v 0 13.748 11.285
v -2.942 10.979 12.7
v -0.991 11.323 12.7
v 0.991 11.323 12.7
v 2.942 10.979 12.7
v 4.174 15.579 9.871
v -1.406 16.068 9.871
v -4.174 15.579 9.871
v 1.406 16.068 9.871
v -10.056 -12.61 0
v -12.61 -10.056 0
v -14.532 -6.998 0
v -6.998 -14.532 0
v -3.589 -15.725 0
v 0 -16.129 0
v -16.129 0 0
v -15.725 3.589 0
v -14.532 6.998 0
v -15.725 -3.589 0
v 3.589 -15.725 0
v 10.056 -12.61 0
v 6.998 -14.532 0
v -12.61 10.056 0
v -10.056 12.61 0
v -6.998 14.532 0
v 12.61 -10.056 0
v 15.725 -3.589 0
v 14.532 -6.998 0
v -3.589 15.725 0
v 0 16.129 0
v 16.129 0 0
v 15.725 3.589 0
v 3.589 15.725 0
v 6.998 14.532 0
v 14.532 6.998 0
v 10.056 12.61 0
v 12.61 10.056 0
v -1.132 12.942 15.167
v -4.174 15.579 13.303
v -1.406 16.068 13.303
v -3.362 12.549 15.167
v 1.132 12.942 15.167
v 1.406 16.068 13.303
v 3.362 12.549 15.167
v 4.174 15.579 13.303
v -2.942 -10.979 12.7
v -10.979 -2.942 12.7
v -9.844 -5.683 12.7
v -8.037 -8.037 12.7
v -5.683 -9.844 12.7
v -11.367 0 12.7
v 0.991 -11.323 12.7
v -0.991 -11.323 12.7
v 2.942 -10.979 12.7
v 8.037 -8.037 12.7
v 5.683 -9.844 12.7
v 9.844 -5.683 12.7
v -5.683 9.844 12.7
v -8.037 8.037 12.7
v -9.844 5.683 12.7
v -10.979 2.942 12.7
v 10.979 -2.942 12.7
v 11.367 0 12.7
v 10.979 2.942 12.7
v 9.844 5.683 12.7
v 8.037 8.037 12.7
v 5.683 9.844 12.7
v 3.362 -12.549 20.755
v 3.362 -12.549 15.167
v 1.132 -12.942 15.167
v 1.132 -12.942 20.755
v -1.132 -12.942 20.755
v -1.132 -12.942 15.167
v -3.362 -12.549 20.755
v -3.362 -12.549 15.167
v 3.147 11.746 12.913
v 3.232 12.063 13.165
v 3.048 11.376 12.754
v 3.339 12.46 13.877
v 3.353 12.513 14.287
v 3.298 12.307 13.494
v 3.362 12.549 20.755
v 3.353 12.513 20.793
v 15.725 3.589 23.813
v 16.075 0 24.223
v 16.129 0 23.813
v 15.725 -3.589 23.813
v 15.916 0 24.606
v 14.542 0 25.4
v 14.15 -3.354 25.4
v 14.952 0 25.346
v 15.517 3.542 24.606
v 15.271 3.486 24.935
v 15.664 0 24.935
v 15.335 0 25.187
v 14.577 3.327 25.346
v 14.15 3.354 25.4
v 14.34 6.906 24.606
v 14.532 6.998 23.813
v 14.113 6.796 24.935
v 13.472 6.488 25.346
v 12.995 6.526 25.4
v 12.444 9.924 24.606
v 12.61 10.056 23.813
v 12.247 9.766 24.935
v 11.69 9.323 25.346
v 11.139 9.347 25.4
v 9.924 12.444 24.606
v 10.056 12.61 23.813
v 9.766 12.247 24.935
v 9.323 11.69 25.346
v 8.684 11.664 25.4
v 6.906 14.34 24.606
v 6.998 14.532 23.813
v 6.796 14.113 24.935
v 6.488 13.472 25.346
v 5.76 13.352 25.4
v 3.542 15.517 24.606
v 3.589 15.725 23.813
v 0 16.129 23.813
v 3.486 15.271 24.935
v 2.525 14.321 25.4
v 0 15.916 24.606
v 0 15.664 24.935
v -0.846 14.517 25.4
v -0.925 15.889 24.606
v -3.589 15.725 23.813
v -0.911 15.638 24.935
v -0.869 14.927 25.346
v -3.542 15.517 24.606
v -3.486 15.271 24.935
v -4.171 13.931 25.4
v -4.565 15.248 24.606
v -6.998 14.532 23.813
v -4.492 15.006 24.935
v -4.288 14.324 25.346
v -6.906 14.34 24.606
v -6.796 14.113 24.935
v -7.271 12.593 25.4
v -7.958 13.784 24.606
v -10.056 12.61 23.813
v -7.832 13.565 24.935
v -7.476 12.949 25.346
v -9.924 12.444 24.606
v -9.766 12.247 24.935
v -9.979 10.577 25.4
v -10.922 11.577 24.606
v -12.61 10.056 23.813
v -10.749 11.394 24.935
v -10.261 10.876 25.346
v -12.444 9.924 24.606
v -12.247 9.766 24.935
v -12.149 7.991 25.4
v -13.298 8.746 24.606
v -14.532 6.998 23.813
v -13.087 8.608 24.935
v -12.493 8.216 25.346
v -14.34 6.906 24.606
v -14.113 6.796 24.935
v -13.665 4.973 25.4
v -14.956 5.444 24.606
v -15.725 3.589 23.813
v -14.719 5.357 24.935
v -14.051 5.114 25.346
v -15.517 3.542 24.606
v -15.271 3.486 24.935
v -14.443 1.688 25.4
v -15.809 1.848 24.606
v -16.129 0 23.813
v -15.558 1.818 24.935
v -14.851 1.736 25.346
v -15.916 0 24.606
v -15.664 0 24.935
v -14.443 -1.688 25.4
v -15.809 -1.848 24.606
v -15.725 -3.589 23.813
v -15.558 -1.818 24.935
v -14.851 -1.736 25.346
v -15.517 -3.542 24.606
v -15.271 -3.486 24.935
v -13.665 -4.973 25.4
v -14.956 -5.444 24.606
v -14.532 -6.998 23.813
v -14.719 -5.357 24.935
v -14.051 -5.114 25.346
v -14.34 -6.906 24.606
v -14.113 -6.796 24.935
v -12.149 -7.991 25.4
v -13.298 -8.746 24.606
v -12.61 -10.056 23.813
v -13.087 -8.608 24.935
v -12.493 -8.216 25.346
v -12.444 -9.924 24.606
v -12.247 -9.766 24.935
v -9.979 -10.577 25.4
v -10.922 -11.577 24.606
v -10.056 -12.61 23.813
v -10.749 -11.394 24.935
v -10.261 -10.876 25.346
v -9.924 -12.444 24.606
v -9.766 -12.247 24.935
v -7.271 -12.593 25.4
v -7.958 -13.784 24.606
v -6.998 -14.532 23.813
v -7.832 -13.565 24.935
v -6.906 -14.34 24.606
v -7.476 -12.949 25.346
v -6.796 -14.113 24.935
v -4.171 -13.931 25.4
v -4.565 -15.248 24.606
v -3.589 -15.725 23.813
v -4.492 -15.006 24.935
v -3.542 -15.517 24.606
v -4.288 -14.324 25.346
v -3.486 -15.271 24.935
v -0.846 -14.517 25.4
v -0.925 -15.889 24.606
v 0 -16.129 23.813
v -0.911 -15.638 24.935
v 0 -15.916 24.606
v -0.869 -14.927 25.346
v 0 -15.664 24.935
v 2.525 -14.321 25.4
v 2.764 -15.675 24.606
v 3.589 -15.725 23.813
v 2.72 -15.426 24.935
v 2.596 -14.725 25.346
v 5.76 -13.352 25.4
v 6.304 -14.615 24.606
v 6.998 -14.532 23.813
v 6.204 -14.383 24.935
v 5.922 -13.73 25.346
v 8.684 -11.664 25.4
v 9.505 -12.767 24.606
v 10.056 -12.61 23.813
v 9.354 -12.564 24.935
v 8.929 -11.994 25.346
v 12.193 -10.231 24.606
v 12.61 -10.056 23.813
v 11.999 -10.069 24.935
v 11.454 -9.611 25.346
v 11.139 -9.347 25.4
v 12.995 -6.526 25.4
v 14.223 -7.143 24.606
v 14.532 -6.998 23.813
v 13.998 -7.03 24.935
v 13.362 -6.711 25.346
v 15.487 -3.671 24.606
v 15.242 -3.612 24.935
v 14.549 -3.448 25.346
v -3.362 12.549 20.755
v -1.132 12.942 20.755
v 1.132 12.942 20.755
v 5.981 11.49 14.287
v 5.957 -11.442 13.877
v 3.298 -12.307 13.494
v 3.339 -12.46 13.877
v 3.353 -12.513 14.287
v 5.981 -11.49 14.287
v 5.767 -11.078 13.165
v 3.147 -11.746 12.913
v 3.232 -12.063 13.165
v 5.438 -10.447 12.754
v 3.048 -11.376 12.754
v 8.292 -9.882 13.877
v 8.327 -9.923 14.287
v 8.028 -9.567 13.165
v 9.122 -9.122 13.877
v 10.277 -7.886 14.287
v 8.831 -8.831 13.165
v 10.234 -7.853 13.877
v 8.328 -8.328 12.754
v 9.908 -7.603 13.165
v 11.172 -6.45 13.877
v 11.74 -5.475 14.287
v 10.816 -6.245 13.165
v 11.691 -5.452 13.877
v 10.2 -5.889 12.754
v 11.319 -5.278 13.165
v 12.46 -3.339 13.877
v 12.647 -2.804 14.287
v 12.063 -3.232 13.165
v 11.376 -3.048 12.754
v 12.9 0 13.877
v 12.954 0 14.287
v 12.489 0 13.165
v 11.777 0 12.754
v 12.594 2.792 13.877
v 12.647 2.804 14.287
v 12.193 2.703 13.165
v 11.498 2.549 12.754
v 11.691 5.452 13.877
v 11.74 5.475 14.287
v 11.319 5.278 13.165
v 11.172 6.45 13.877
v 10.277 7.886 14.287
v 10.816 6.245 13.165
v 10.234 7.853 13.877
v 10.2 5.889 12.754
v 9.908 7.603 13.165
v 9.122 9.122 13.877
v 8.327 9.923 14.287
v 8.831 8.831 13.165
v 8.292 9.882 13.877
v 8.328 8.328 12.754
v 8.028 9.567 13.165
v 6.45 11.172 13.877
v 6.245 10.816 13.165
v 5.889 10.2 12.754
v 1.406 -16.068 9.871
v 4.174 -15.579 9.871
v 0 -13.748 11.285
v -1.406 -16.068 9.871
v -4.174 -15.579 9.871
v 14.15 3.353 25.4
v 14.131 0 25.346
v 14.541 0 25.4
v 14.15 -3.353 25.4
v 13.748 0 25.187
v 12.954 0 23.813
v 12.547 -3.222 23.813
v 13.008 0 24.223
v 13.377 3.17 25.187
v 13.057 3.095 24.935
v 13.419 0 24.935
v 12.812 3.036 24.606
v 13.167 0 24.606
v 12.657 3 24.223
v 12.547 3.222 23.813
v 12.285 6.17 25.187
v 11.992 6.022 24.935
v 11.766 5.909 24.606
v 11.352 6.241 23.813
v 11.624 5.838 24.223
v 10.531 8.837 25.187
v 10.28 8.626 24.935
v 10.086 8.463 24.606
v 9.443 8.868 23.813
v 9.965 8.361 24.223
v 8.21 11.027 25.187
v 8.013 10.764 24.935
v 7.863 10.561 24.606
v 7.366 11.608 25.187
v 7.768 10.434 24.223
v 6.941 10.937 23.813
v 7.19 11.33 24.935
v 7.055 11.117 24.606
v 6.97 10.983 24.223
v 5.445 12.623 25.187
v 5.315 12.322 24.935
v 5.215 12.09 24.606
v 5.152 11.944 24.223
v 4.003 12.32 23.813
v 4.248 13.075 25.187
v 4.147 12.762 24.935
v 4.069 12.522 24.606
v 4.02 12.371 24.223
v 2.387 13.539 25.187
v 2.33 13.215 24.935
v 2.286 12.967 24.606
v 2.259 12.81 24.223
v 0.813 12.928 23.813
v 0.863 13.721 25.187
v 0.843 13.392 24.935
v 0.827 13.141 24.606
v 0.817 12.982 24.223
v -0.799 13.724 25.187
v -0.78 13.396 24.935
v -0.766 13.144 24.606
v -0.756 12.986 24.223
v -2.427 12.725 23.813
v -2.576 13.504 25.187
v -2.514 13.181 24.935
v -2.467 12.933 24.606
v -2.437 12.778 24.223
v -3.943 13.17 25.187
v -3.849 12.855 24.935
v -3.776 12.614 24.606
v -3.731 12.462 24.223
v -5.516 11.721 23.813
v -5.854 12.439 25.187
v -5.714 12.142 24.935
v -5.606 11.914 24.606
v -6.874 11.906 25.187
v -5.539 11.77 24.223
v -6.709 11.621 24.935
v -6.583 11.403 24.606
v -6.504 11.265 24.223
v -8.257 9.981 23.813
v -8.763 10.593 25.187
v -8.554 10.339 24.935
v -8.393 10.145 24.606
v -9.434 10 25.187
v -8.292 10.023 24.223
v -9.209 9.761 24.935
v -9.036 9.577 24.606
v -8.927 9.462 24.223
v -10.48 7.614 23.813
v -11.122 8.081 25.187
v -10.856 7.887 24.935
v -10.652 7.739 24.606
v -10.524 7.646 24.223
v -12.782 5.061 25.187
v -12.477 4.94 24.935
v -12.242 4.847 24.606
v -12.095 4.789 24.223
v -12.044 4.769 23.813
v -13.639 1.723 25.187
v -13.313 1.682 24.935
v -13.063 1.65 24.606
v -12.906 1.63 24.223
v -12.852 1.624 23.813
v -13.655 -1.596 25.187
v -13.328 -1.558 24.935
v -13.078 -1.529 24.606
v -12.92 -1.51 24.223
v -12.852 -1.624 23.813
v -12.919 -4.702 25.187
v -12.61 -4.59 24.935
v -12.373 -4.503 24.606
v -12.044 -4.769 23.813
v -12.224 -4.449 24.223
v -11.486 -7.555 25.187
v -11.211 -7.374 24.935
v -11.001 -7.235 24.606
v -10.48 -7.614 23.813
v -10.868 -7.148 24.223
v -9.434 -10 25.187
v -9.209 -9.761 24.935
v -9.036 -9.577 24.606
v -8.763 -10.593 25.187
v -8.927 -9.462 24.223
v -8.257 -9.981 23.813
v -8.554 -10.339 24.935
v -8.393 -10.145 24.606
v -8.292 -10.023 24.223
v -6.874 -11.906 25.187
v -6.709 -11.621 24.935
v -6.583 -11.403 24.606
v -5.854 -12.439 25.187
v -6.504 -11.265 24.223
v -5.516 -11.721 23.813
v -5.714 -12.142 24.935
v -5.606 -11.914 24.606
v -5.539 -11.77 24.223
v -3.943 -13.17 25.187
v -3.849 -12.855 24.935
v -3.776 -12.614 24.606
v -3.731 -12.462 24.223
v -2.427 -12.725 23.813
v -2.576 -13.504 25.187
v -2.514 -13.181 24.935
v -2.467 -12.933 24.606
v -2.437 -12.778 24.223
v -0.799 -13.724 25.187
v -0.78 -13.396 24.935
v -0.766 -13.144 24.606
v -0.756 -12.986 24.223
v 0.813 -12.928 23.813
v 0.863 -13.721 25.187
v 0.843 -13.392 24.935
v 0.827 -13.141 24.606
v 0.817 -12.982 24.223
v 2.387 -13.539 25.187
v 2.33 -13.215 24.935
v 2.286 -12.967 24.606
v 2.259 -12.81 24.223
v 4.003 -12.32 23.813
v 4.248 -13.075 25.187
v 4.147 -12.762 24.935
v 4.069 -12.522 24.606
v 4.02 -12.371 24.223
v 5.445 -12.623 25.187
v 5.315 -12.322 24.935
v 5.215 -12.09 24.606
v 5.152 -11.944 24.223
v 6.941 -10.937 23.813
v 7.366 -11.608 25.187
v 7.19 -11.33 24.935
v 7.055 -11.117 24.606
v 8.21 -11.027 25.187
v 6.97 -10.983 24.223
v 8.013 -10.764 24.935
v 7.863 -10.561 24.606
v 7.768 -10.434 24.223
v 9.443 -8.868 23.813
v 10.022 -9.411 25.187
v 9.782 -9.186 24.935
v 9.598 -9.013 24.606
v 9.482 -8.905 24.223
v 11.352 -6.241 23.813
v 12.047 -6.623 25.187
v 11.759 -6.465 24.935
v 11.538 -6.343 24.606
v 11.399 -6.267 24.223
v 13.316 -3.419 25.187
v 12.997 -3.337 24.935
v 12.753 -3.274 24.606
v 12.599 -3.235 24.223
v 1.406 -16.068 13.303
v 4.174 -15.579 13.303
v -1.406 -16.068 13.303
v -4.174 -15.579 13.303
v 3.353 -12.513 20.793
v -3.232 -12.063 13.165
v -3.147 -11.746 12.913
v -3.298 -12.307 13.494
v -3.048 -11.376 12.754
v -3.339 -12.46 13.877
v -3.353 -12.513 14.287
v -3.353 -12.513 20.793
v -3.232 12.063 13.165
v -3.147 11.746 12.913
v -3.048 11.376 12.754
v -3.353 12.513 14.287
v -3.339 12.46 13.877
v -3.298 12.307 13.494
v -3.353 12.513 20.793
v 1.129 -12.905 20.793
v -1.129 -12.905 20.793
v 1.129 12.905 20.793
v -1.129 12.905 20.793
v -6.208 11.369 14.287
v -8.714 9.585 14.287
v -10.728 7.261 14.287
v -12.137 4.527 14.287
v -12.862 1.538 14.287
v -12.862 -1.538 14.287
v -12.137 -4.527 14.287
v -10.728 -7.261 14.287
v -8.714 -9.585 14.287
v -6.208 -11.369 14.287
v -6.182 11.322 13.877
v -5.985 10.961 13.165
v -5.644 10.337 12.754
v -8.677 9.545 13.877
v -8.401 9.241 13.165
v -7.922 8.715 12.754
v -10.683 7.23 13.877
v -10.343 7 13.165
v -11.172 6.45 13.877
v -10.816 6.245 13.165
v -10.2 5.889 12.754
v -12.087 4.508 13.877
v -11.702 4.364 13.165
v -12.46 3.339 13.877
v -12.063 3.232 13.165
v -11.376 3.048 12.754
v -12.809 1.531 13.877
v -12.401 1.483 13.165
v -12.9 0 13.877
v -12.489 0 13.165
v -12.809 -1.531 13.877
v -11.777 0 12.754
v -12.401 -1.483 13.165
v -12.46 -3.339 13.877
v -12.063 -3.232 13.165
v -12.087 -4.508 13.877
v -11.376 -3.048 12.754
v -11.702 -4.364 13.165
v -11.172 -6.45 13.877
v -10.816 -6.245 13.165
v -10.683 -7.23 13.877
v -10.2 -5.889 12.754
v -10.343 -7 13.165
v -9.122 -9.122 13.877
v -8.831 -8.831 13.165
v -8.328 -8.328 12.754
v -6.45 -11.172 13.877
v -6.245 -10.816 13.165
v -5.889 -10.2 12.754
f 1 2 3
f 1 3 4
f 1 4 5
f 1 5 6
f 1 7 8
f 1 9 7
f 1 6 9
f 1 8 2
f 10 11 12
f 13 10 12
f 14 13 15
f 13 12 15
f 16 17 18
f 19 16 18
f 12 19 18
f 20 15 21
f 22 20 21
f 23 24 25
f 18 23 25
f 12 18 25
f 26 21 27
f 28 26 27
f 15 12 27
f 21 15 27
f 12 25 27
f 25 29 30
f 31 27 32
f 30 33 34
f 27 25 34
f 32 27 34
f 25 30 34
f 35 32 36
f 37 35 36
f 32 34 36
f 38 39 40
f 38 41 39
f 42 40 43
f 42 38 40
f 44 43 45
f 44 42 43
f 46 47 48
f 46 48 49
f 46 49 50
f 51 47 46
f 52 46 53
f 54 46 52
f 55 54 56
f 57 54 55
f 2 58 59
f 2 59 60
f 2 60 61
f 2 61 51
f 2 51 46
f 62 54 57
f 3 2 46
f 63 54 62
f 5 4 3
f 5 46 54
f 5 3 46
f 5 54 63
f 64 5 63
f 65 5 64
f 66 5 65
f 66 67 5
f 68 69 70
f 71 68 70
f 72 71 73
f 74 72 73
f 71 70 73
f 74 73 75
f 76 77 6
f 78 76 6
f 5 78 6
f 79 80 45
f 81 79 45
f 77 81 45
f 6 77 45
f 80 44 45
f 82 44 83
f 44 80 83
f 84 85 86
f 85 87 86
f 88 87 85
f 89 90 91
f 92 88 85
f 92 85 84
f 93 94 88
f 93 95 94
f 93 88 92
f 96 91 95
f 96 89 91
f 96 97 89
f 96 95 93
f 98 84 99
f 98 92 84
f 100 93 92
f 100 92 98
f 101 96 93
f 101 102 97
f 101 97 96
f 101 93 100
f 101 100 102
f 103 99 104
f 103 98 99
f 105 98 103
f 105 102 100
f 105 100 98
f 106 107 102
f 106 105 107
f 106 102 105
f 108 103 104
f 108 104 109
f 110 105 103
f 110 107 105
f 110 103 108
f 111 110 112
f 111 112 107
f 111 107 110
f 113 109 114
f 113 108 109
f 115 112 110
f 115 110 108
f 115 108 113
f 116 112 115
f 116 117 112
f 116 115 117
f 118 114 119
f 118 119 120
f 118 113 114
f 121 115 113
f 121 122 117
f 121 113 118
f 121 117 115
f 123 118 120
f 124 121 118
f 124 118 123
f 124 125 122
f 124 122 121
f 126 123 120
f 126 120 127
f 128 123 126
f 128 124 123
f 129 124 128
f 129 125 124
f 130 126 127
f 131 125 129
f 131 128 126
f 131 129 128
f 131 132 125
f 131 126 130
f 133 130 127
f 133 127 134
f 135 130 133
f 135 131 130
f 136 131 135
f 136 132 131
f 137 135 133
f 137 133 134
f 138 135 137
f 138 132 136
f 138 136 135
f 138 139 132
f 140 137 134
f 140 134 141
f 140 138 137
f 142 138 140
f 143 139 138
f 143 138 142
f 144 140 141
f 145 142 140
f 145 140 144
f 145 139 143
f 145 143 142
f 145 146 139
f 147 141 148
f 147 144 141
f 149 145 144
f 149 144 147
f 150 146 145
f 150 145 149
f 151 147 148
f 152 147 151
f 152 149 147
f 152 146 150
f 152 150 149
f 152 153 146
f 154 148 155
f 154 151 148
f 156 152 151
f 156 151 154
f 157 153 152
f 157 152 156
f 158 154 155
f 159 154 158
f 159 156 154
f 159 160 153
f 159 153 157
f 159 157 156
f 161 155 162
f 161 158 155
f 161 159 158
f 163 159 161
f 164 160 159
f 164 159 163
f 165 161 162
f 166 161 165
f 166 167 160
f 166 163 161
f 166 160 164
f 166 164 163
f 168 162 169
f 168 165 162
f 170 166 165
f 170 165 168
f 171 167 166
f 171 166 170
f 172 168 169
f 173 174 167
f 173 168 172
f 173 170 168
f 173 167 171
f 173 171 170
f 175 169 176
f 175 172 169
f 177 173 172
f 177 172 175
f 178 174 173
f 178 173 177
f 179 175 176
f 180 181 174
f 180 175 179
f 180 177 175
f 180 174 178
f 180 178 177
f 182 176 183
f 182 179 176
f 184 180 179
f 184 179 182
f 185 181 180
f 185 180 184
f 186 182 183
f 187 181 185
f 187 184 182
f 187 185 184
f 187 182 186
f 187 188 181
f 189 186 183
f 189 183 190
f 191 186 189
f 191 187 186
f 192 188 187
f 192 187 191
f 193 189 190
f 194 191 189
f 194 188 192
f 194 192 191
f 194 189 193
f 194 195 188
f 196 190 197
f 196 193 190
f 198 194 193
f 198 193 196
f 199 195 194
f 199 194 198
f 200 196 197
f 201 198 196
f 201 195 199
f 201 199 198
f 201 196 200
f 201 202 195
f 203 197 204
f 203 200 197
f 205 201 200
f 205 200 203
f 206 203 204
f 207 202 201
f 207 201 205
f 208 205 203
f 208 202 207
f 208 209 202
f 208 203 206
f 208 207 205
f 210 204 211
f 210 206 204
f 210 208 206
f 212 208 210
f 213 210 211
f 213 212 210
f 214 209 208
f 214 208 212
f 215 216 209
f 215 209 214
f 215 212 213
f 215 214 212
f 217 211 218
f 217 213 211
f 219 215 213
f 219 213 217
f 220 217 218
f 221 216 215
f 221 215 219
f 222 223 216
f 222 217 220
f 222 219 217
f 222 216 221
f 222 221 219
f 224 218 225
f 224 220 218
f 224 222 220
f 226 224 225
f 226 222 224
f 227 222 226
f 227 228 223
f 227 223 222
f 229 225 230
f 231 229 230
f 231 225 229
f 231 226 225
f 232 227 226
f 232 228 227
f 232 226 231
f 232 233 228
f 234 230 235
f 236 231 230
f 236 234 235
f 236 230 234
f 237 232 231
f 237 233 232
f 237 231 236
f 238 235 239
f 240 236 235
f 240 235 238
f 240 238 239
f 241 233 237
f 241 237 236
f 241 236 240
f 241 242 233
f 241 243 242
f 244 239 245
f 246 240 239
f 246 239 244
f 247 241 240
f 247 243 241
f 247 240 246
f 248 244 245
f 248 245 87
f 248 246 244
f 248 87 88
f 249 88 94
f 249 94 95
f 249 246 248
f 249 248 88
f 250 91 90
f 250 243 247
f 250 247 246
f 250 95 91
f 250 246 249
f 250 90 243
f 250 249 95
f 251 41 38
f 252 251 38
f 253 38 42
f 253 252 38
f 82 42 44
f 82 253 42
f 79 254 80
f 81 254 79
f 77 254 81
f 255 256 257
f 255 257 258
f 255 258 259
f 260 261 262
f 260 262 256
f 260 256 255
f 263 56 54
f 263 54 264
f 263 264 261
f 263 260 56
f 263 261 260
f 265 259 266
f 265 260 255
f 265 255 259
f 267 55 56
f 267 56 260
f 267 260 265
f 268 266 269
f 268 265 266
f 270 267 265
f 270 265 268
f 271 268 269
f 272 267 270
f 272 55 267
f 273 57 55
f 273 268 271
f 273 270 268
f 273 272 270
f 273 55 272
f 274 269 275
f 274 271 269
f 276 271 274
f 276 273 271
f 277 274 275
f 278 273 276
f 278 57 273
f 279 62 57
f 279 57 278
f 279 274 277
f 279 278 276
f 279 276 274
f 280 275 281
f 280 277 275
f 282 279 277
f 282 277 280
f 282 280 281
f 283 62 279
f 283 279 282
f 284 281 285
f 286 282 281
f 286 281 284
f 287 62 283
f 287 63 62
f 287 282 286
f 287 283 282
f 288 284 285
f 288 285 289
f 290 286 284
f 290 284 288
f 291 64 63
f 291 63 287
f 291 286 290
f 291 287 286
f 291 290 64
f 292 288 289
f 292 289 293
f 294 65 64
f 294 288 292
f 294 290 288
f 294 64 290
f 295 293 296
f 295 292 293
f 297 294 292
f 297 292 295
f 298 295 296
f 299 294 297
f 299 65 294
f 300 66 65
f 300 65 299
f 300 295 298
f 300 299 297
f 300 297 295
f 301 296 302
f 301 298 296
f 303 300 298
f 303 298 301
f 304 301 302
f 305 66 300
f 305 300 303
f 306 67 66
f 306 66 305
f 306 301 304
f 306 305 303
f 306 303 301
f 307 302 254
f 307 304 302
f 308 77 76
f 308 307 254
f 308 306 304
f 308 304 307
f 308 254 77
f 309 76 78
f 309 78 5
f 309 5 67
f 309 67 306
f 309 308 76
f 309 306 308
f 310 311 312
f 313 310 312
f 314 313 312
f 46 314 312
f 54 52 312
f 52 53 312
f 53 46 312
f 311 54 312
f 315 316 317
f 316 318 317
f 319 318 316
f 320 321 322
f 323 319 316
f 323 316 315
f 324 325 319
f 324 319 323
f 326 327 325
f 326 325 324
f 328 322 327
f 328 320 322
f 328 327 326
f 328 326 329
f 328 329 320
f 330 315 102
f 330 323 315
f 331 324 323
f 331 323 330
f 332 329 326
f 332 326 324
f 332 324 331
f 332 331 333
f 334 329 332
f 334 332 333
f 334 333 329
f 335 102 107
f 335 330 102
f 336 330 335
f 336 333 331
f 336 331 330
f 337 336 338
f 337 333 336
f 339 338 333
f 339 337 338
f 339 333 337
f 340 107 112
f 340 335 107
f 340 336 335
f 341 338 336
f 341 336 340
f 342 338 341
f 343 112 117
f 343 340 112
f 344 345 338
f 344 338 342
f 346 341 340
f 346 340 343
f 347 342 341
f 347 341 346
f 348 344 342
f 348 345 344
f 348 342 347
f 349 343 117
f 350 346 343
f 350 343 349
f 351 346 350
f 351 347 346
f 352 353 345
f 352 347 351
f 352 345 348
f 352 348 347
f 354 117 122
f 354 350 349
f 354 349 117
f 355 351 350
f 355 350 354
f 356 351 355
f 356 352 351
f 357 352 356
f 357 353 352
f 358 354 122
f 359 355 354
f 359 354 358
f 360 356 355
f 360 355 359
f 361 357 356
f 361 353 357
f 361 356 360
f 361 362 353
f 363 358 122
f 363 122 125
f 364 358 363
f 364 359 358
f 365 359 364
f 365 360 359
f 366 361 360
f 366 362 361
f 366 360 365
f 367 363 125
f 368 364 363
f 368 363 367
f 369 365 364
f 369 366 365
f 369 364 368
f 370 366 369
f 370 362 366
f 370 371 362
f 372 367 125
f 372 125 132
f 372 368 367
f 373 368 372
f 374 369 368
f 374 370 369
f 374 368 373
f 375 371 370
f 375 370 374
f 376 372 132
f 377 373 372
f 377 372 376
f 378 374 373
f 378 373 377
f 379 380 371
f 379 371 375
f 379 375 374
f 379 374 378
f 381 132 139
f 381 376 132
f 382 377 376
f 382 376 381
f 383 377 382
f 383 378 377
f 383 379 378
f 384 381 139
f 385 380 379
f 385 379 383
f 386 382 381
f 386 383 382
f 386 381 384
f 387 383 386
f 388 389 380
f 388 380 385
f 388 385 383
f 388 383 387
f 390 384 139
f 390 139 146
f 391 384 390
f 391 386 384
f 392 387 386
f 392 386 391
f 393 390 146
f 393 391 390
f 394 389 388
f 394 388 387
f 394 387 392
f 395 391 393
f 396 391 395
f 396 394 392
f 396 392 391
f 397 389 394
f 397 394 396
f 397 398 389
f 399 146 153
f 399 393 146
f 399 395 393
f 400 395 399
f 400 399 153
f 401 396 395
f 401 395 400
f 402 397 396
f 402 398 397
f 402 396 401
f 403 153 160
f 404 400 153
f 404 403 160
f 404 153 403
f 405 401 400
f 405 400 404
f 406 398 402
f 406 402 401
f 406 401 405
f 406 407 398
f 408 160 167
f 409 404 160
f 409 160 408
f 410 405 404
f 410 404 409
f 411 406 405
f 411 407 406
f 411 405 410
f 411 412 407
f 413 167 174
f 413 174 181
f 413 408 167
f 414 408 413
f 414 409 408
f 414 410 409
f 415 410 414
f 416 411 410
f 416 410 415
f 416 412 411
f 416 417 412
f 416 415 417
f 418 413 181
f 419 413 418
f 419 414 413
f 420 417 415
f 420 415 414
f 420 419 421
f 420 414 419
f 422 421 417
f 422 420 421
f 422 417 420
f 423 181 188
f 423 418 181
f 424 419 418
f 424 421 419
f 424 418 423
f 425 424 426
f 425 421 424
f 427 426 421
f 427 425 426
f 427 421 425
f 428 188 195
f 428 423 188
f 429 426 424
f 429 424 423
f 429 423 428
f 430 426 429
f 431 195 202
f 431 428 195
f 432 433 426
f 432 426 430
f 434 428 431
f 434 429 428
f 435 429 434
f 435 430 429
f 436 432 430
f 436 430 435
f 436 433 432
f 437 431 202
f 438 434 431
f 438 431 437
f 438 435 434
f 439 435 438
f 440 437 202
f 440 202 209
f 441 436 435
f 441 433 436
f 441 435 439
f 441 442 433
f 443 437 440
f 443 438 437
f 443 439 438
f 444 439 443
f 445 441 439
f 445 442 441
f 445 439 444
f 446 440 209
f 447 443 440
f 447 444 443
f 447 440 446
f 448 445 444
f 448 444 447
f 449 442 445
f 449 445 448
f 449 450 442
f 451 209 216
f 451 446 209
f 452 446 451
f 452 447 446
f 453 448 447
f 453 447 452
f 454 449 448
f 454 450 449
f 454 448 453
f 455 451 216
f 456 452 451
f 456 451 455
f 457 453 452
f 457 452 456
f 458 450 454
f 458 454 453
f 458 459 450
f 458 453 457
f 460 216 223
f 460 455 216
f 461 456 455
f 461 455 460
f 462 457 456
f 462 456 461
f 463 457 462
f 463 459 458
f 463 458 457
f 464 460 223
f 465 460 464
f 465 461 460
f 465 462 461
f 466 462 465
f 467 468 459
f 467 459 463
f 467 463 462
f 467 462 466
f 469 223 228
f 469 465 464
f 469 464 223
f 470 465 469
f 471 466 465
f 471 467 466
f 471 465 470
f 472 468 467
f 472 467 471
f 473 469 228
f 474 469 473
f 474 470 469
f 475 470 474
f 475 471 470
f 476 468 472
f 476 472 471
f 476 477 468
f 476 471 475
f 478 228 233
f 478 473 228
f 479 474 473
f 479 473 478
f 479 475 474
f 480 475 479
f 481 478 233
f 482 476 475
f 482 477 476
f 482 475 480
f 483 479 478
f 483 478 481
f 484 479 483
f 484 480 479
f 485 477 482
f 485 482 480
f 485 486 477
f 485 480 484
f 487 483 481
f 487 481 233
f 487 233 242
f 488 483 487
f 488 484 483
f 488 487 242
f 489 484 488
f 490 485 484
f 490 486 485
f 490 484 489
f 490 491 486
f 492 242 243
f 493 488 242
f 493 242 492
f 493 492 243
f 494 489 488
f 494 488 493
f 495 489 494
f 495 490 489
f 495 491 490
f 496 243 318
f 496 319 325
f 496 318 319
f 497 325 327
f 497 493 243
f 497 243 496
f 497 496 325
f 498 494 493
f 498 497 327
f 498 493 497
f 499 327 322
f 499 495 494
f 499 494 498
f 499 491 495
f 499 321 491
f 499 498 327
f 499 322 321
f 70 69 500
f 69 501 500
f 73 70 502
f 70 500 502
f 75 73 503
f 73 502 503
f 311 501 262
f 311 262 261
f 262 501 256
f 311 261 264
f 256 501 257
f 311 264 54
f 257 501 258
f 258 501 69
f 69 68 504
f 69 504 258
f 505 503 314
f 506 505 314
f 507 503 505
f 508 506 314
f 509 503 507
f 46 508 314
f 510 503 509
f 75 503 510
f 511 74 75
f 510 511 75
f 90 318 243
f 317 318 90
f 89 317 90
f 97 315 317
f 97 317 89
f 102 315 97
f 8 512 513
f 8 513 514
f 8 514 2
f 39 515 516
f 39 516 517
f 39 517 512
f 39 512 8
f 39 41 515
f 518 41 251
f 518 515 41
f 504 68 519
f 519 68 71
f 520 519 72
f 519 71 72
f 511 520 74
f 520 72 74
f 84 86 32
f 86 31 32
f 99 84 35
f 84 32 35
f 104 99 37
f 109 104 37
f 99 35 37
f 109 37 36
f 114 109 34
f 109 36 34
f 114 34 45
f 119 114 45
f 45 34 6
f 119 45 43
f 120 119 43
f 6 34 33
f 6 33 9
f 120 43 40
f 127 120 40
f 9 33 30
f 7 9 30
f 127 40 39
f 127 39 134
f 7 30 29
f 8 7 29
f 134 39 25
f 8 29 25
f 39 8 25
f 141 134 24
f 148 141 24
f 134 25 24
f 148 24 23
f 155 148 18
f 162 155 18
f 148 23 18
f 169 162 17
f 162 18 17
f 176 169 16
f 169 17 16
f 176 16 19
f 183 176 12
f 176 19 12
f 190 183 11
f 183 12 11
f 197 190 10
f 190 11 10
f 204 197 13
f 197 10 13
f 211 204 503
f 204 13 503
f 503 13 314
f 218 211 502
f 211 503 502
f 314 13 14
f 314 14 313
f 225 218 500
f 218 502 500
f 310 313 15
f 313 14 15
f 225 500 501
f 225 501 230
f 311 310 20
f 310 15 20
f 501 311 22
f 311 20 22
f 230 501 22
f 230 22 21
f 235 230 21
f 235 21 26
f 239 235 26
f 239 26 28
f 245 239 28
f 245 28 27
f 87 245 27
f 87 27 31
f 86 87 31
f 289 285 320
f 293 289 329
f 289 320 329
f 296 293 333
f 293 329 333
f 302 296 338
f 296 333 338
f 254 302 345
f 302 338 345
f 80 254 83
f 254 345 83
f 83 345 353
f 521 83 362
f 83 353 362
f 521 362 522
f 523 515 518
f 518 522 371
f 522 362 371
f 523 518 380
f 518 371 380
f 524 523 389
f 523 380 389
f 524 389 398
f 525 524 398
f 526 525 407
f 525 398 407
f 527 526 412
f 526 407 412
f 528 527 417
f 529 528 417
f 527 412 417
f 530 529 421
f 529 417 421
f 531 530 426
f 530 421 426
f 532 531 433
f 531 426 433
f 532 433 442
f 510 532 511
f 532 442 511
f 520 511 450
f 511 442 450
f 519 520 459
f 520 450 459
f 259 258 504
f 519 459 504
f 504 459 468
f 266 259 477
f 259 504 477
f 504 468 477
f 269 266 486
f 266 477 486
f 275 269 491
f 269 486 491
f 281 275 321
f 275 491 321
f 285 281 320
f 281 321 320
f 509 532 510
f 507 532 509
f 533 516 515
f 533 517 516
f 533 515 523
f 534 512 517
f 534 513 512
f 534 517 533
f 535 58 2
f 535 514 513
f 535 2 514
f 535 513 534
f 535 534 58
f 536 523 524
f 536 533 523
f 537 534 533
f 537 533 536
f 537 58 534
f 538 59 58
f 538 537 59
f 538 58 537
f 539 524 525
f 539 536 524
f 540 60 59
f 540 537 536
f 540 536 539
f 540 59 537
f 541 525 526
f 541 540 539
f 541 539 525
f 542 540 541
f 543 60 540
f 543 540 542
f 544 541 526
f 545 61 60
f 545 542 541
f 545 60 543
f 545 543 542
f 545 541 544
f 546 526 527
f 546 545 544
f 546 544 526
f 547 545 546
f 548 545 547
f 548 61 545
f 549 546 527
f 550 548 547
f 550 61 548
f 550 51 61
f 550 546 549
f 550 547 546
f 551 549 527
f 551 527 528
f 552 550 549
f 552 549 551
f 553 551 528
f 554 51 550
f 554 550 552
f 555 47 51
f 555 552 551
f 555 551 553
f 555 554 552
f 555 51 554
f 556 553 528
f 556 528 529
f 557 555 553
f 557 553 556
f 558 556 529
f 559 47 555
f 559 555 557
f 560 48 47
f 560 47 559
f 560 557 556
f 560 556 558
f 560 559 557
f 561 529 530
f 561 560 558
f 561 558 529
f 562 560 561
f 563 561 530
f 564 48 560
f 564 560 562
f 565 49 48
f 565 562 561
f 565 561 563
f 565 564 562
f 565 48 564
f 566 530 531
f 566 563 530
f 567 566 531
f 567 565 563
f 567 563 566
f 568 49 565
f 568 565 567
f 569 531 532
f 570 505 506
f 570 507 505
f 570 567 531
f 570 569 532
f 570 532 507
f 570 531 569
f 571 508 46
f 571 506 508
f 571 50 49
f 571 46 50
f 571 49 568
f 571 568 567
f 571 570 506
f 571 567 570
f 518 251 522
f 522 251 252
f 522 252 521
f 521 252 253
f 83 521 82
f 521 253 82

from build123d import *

# Parameters (mm, degrees)
F1_R          = 16.129
F2_DEPTH      = 25.4
F3_R          = 12.954
F4_DEPTH      = 12.7
F5_R          = 1.58749
F7_ANGLE_BACK = 15
F7_ANGLE      = 30
F8_T4_ANGLE   = 47.2856392703
F8_S5_R       = 12.954
F8_T6_DEPTH   = 7
F8_T10_ANGLE  = 47.2856392703
F8_S11_R      = 12.954
F8_T12_DEPTH  = 7


# Not quite as in the source:
# - a fillet or chamfer that OpenCascade refuses, or shapes differently, is made with other operations: its cross-section is extruded or revolved along the edge and cut away or added
# - a fillet or chamfer is up to 0.001 mm smaller than in the source, because OpenCascade refuses the exact size
# - ends of sketch curves that miss each other by under 0.0002 mm in the source are joined


with BuildPart() as f2:
    # F1 (on Top) → F2 (new body)
    with BuildSketch(Plane.XY):
        Circle(F1_R)
    extrude(amount=F2_DEPTH)

    # F3 (on face) → F4 (cut)
    with BuildSketch(Plane.XY.offset(25.4)):
        Circle(F3_R)
    extrude(amount=-F4_DEPTH, mode=Mode.SUBTRACT)

    # F5 (radius 1.5875 in the source; OpenCascade refuses exactly that, so slightly less here)
    f5_edges = [f2.edges().sort_by_distance(p)[0] for p in [
        (-16.129, 0, 25.4),
        (-12.954, 0, 25.4),
        (-12.954, 0, 12.7),
    ]]
    fillet(f5_edges, radius=F5_R)

    # F6 (on Right) → F7 (revolve, cut)
    with BuildSketch(Plane.YZ, mode=Mode.PRIVATE) as f7_sk:
        with BuildLine():
            ThreePointArc((12.2294899884, 15.6199430682), (12.8889010018, 13.8375539592), (11.3665, 12.7))
            Line((11.3665, 12.7), (16.129, 9.8708188202))
            Line((16.129, 9.8708188202), (16.129, 13.3034244871))
            Line((16.129, 13.3034244871), (12.9914900466, 15.1672741693))
            Line((12.9914900466, 15.1672741693), (12.2294899884, 15.6199430682))
        make_face()
        with BuildLine():
            Line((-16.129, 9.8708188202), (-11.3665, 12.7))
            ThreePointArc((-11.3665, 12.7), (-12.8889010018, 13.8375539592), (-12.2294899884, 15.6199430682))
            Line((-12.2294899884, 15.6199430682), (-12.9914900466, 15.1672741693))
            Line((-12.9914900466, 15.1672741693), (-16.129, 13.3034244871))
            Line((-16.129, 13.3034244871), (-16.129, 9.8708188202))
        make_face()
        Polygon((12.2294900466, 21.5172741693), (12.2294900466, 15.6199431581), (12.9914900466, 15.1672741693), (12.9914900466, 21.5172741693), align=None)
        Polygon((-12.9914900466, 15.1672741693), (-12.2294900466, 15.6199431581), (-12.2294900466, 21.5172741693), (-12.9914900466, 21.5172741693), align=None)
    revolve(f7_sk.sketch.rotate(Axis((0, 0, 7.0286970586), (0, 0, -1)), -F7_ANGLE_BACK), axis=Axis((0, 0, 7.0286970586), (0, 0, -1)), revolution_arc=F7_ANGLE, mode=Mode.SUBTRACT)

    # F8: chamfer of 0.762 on 2 edges, made by hand


with BuildPart() as f8_tool2:
    # F8_s3 → F8_t4 (revolve)
    with BuildSketch(Plane(origin=(0, 0, 0), x_dir=(0, 0, 1), z_dir=(0.9160632754, 0.4010337585, 0))):
        Polygon((21.5172741693, 12.2294900466), (20.7552741693, 12.9914900466), (21.5172741693, 12.9914900466), align=None)
    revolve(axis=Axis((0, 0, 21.5172741693), (0, 0, -1)), revolution_arc=F8_T4_ANGLE)

    # F8_s5 → F8_t6 (cut, symmetric)
    with BuildSketch(Plane.XY.offset(21.1)):
        Circle(F8_S5_R)
    extrude(amount=F8_T6_DEPTH, both=True, mode=Mode.SUBTRACT)


with BuildPart() as f2_1:
    add(f2.part)

    # F8_t1: union F8_tool2
    add(f8_tool2.part)


with BuildPart() as f8_tool8:
    # F8_s9 → F8_t10 (revolve)
    with BuildSketch(Plane(origin=(0, 0, 0), x_dir=(0, 0, 1), z_dir=(-0.9160632754, -0.4010337585, 0))):
        Polygon((21.5172741693, 12.2294900466), (20.7552741693, 12.9914900466), (21.5172741693, 12.9914900466), align=None)
    revolve(axis=Axis((0, 0, 21.5172741693), (0, 0, -1)), revolution_arc=F8_T10_ANGLE)

    # F8_s11 → F8_t12 (cut, symmetric)
    with BuildSketch(Plane.XY.offset(21.1)):
        Circle(F8_S11_R)
    extrude(amount=F8_T12_DEPTH, both=True, mode=Mode.SUBTRACT)


with BuildPart() as f2_2:
    add(f2_1.part)

    # F8_t7: union F8_tool8
    add(f8_tool8.part)


solid = f2_2.part
